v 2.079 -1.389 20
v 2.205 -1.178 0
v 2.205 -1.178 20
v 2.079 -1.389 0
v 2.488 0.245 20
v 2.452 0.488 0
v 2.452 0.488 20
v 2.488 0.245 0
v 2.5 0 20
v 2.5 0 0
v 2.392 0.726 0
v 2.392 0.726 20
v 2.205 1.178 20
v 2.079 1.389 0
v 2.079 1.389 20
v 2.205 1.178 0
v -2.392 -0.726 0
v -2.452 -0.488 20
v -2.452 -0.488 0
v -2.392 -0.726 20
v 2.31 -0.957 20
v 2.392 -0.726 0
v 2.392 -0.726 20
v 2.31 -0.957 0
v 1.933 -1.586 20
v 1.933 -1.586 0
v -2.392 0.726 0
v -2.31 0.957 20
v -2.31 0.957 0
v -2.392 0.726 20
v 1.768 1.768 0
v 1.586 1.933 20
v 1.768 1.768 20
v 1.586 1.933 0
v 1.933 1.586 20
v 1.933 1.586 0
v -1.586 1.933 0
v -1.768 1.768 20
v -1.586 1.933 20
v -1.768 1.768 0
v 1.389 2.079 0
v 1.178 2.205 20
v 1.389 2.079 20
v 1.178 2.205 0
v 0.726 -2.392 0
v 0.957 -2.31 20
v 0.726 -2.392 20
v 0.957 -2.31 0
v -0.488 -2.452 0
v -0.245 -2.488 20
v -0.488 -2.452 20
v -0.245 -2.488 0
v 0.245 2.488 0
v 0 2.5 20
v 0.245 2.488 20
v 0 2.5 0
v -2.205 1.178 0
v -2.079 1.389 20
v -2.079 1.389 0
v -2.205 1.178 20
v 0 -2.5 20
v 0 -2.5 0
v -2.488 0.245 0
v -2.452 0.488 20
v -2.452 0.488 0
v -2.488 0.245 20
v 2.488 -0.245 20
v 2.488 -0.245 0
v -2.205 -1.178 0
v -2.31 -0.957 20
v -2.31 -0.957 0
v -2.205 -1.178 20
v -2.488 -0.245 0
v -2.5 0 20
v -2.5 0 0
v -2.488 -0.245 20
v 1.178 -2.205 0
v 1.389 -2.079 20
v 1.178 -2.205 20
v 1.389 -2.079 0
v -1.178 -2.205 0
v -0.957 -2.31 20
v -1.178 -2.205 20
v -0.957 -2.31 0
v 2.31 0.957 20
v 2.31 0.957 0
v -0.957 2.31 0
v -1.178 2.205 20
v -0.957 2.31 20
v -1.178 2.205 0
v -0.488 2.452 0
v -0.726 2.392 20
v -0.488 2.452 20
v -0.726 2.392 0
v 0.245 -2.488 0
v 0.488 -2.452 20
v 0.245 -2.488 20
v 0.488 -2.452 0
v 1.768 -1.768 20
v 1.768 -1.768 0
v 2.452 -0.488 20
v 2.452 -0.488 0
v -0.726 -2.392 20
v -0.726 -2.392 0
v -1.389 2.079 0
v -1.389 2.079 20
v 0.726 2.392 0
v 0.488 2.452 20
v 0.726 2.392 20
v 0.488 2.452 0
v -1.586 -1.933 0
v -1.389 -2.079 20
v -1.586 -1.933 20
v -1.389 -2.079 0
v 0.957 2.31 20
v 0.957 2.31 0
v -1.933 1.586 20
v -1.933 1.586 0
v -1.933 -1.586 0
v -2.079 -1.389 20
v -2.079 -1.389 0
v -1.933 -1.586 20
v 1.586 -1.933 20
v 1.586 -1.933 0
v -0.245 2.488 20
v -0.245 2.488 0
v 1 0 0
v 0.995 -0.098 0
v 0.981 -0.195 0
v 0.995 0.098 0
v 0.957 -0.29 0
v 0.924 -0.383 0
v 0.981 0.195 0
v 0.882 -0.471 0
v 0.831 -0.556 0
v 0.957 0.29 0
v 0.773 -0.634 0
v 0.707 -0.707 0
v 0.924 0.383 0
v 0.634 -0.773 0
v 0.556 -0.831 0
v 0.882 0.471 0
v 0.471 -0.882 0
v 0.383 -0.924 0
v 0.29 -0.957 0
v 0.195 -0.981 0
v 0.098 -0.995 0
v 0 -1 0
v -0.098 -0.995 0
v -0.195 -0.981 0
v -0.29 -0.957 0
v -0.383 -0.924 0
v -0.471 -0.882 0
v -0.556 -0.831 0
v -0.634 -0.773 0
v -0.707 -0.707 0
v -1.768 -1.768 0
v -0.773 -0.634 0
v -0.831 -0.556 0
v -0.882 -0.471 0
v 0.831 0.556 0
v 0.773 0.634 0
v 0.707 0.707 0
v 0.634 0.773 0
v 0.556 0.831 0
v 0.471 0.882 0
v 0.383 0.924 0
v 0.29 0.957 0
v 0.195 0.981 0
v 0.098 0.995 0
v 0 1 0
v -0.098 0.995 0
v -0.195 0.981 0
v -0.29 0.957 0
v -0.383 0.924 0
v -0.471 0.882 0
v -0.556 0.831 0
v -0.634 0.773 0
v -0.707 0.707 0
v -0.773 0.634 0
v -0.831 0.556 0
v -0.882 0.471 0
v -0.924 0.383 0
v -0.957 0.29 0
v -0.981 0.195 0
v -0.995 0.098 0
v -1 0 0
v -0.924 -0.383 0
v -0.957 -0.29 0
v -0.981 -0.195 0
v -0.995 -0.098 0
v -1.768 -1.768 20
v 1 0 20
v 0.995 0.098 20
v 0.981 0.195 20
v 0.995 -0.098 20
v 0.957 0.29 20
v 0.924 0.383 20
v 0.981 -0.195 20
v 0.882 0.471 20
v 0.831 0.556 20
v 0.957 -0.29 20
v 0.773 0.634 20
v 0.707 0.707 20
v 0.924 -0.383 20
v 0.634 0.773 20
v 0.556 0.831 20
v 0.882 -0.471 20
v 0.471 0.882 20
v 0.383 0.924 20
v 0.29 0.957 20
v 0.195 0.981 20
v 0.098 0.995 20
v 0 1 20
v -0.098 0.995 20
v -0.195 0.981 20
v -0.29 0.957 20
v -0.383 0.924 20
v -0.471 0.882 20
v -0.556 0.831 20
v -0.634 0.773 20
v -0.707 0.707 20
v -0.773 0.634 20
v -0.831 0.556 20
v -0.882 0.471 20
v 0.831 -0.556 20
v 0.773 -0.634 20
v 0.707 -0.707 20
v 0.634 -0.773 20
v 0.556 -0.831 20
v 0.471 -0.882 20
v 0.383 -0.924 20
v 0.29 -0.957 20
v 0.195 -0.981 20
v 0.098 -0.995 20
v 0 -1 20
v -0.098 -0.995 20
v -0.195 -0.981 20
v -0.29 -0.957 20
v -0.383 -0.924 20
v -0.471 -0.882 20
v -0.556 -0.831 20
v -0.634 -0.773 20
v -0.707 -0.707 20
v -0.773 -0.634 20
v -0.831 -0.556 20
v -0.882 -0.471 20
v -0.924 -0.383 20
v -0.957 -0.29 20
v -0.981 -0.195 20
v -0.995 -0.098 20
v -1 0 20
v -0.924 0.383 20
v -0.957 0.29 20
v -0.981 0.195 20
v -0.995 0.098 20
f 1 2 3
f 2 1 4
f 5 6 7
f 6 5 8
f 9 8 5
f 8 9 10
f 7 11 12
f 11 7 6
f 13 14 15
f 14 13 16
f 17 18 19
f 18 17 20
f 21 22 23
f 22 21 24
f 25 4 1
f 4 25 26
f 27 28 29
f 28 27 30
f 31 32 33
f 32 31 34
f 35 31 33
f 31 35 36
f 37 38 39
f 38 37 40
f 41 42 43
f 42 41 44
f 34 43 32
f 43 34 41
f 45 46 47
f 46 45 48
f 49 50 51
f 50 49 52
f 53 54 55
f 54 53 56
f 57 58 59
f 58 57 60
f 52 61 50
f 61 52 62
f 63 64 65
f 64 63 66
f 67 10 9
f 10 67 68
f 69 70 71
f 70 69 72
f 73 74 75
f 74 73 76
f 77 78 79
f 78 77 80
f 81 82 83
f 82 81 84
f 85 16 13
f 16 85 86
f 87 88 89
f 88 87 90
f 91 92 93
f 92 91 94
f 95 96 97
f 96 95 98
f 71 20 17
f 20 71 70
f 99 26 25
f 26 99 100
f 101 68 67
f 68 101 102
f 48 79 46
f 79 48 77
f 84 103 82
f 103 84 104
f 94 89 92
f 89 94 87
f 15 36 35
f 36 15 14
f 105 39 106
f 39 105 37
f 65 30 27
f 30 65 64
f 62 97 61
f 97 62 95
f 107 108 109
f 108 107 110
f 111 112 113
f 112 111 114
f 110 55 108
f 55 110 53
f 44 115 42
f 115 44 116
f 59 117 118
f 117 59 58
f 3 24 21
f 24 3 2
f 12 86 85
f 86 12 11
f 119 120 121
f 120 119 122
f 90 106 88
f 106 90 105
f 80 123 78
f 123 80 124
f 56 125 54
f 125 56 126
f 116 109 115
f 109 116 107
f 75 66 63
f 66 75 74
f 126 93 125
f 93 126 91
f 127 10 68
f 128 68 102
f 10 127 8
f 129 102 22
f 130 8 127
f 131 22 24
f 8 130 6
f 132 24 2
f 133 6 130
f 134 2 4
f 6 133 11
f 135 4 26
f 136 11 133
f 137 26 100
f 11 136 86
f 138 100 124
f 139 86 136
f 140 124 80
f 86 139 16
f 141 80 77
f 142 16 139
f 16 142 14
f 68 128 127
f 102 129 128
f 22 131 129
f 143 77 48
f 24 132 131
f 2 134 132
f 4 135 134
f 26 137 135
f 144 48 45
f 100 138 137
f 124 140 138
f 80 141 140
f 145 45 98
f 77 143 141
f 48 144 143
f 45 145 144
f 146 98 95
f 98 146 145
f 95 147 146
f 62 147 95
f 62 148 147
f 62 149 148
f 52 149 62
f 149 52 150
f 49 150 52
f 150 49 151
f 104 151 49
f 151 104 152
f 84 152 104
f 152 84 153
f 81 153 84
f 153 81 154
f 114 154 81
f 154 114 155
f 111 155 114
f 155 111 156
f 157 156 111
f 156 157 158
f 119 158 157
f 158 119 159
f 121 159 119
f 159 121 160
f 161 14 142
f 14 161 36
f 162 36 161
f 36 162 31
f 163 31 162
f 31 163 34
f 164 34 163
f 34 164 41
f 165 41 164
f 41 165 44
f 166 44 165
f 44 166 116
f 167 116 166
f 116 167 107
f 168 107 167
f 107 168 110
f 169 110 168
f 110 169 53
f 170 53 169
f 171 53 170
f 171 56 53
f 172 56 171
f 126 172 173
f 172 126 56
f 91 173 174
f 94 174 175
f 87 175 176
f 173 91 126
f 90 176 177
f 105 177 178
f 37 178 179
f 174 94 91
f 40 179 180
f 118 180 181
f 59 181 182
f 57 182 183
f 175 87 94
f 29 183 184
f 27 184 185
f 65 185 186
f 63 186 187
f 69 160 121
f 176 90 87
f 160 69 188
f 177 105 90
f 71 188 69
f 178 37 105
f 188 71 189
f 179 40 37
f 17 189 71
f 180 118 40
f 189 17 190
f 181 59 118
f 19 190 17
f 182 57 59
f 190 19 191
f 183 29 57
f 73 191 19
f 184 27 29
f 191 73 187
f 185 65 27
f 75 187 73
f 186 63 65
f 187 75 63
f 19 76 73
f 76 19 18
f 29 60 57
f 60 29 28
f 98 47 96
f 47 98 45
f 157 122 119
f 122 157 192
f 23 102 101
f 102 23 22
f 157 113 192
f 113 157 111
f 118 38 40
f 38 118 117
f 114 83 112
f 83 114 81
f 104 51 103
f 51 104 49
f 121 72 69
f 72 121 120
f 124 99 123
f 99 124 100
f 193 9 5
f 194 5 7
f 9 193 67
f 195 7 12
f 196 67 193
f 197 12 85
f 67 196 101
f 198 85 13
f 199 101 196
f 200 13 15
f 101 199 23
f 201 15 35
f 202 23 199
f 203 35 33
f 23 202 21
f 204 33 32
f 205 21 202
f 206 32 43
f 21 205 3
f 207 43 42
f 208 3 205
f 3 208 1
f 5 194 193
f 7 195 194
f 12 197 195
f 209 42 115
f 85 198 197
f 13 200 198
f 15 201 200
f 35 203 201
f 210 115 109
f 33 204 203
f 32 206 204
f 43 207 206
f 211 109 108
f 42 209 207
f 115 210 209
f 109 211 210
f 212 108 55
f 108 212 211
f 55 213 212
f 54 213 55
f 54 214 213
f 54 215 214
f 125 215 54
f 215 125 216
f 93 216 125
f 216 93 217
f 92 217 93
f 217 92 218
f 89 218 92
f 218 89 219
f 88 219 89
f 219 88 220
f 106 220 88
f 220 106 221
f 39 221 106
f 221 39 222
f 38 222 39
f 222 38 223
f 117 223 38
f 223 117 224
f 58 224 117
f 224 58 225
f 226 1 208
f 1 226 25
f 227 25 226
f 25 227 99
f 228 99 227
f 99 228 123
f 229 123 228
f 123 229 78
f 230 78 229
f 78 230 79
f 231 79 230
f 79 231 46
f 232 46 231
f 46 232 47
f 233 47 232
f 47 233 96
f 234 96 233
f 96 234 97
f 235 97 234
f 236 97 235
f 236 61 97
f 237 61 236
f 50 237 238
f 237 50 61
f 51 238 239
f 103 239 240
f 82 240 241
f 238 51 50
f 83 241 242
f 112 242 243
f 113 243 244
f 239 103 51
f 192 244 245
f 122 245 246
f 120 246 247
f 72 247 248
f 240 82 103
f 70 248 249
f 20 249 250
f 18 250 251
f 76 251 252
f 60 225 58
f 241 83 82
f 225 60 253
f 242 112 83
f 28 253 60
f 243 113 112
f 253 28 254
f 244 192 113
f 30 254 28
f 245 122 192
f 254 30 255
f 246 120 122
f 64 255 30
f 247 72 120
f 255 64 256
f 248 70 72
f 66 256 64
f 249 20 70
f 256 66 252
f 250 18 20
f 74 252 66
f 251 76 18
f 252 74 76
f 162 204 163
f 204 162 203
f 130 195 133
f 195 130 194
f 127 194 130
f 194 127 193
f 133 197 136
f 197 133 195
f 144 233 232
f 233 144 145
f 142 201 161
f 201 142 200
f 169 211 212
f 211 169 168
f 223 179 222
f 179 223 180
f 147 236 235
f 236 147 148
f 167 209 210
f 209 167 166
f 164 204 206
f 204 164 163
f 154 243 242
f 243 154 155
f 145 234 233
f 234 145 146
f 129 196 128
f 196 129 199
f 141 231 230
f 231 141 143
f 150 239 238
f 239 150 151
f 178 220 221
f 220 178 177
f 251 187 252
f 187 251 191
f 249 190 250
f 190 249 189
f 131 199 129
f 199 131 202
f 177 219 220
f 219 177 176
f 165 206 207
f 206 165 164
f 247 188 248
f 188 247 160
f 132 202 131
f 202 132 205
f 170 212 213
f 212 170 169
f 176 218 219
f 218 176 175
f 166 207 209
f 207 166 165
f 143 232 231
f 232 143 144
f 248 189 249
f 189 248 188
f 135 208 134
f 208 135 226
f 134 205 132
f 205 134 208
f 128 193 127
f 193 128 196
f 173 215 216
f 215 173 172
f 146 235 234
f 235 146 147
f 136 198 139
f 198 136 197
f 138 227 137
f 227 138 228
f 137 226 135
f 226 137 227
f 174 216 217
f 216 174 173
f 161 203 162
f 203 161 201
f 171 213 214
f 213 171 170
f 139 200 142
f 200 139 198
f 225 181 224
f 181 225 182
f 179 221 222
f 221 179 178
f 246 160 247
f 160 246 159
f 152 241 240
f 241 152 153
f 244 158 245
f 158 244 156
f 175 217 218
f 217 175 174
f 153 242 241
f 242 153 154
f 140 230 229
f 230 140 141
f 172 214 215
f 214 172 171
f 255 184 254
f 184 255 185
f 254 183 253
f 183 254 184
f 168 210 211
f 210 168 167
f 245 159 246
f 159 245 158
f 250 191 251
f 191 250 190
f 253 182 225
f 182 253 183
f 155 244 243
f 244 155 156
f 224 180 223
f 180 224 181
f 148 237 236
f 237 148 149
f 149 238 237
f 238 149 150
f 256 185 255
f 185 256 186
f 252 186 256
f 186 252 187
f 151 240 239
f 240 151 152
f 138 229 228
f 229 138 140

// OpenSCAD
$fn=64;
outer_d = 5;
inner_d = 2;
height = 20;

difference()
{
    cylinder(d=outer_d, h=height);
    translate([0,0,-0.5])
    cylinder(d=inner_d, h=height+1);
}
